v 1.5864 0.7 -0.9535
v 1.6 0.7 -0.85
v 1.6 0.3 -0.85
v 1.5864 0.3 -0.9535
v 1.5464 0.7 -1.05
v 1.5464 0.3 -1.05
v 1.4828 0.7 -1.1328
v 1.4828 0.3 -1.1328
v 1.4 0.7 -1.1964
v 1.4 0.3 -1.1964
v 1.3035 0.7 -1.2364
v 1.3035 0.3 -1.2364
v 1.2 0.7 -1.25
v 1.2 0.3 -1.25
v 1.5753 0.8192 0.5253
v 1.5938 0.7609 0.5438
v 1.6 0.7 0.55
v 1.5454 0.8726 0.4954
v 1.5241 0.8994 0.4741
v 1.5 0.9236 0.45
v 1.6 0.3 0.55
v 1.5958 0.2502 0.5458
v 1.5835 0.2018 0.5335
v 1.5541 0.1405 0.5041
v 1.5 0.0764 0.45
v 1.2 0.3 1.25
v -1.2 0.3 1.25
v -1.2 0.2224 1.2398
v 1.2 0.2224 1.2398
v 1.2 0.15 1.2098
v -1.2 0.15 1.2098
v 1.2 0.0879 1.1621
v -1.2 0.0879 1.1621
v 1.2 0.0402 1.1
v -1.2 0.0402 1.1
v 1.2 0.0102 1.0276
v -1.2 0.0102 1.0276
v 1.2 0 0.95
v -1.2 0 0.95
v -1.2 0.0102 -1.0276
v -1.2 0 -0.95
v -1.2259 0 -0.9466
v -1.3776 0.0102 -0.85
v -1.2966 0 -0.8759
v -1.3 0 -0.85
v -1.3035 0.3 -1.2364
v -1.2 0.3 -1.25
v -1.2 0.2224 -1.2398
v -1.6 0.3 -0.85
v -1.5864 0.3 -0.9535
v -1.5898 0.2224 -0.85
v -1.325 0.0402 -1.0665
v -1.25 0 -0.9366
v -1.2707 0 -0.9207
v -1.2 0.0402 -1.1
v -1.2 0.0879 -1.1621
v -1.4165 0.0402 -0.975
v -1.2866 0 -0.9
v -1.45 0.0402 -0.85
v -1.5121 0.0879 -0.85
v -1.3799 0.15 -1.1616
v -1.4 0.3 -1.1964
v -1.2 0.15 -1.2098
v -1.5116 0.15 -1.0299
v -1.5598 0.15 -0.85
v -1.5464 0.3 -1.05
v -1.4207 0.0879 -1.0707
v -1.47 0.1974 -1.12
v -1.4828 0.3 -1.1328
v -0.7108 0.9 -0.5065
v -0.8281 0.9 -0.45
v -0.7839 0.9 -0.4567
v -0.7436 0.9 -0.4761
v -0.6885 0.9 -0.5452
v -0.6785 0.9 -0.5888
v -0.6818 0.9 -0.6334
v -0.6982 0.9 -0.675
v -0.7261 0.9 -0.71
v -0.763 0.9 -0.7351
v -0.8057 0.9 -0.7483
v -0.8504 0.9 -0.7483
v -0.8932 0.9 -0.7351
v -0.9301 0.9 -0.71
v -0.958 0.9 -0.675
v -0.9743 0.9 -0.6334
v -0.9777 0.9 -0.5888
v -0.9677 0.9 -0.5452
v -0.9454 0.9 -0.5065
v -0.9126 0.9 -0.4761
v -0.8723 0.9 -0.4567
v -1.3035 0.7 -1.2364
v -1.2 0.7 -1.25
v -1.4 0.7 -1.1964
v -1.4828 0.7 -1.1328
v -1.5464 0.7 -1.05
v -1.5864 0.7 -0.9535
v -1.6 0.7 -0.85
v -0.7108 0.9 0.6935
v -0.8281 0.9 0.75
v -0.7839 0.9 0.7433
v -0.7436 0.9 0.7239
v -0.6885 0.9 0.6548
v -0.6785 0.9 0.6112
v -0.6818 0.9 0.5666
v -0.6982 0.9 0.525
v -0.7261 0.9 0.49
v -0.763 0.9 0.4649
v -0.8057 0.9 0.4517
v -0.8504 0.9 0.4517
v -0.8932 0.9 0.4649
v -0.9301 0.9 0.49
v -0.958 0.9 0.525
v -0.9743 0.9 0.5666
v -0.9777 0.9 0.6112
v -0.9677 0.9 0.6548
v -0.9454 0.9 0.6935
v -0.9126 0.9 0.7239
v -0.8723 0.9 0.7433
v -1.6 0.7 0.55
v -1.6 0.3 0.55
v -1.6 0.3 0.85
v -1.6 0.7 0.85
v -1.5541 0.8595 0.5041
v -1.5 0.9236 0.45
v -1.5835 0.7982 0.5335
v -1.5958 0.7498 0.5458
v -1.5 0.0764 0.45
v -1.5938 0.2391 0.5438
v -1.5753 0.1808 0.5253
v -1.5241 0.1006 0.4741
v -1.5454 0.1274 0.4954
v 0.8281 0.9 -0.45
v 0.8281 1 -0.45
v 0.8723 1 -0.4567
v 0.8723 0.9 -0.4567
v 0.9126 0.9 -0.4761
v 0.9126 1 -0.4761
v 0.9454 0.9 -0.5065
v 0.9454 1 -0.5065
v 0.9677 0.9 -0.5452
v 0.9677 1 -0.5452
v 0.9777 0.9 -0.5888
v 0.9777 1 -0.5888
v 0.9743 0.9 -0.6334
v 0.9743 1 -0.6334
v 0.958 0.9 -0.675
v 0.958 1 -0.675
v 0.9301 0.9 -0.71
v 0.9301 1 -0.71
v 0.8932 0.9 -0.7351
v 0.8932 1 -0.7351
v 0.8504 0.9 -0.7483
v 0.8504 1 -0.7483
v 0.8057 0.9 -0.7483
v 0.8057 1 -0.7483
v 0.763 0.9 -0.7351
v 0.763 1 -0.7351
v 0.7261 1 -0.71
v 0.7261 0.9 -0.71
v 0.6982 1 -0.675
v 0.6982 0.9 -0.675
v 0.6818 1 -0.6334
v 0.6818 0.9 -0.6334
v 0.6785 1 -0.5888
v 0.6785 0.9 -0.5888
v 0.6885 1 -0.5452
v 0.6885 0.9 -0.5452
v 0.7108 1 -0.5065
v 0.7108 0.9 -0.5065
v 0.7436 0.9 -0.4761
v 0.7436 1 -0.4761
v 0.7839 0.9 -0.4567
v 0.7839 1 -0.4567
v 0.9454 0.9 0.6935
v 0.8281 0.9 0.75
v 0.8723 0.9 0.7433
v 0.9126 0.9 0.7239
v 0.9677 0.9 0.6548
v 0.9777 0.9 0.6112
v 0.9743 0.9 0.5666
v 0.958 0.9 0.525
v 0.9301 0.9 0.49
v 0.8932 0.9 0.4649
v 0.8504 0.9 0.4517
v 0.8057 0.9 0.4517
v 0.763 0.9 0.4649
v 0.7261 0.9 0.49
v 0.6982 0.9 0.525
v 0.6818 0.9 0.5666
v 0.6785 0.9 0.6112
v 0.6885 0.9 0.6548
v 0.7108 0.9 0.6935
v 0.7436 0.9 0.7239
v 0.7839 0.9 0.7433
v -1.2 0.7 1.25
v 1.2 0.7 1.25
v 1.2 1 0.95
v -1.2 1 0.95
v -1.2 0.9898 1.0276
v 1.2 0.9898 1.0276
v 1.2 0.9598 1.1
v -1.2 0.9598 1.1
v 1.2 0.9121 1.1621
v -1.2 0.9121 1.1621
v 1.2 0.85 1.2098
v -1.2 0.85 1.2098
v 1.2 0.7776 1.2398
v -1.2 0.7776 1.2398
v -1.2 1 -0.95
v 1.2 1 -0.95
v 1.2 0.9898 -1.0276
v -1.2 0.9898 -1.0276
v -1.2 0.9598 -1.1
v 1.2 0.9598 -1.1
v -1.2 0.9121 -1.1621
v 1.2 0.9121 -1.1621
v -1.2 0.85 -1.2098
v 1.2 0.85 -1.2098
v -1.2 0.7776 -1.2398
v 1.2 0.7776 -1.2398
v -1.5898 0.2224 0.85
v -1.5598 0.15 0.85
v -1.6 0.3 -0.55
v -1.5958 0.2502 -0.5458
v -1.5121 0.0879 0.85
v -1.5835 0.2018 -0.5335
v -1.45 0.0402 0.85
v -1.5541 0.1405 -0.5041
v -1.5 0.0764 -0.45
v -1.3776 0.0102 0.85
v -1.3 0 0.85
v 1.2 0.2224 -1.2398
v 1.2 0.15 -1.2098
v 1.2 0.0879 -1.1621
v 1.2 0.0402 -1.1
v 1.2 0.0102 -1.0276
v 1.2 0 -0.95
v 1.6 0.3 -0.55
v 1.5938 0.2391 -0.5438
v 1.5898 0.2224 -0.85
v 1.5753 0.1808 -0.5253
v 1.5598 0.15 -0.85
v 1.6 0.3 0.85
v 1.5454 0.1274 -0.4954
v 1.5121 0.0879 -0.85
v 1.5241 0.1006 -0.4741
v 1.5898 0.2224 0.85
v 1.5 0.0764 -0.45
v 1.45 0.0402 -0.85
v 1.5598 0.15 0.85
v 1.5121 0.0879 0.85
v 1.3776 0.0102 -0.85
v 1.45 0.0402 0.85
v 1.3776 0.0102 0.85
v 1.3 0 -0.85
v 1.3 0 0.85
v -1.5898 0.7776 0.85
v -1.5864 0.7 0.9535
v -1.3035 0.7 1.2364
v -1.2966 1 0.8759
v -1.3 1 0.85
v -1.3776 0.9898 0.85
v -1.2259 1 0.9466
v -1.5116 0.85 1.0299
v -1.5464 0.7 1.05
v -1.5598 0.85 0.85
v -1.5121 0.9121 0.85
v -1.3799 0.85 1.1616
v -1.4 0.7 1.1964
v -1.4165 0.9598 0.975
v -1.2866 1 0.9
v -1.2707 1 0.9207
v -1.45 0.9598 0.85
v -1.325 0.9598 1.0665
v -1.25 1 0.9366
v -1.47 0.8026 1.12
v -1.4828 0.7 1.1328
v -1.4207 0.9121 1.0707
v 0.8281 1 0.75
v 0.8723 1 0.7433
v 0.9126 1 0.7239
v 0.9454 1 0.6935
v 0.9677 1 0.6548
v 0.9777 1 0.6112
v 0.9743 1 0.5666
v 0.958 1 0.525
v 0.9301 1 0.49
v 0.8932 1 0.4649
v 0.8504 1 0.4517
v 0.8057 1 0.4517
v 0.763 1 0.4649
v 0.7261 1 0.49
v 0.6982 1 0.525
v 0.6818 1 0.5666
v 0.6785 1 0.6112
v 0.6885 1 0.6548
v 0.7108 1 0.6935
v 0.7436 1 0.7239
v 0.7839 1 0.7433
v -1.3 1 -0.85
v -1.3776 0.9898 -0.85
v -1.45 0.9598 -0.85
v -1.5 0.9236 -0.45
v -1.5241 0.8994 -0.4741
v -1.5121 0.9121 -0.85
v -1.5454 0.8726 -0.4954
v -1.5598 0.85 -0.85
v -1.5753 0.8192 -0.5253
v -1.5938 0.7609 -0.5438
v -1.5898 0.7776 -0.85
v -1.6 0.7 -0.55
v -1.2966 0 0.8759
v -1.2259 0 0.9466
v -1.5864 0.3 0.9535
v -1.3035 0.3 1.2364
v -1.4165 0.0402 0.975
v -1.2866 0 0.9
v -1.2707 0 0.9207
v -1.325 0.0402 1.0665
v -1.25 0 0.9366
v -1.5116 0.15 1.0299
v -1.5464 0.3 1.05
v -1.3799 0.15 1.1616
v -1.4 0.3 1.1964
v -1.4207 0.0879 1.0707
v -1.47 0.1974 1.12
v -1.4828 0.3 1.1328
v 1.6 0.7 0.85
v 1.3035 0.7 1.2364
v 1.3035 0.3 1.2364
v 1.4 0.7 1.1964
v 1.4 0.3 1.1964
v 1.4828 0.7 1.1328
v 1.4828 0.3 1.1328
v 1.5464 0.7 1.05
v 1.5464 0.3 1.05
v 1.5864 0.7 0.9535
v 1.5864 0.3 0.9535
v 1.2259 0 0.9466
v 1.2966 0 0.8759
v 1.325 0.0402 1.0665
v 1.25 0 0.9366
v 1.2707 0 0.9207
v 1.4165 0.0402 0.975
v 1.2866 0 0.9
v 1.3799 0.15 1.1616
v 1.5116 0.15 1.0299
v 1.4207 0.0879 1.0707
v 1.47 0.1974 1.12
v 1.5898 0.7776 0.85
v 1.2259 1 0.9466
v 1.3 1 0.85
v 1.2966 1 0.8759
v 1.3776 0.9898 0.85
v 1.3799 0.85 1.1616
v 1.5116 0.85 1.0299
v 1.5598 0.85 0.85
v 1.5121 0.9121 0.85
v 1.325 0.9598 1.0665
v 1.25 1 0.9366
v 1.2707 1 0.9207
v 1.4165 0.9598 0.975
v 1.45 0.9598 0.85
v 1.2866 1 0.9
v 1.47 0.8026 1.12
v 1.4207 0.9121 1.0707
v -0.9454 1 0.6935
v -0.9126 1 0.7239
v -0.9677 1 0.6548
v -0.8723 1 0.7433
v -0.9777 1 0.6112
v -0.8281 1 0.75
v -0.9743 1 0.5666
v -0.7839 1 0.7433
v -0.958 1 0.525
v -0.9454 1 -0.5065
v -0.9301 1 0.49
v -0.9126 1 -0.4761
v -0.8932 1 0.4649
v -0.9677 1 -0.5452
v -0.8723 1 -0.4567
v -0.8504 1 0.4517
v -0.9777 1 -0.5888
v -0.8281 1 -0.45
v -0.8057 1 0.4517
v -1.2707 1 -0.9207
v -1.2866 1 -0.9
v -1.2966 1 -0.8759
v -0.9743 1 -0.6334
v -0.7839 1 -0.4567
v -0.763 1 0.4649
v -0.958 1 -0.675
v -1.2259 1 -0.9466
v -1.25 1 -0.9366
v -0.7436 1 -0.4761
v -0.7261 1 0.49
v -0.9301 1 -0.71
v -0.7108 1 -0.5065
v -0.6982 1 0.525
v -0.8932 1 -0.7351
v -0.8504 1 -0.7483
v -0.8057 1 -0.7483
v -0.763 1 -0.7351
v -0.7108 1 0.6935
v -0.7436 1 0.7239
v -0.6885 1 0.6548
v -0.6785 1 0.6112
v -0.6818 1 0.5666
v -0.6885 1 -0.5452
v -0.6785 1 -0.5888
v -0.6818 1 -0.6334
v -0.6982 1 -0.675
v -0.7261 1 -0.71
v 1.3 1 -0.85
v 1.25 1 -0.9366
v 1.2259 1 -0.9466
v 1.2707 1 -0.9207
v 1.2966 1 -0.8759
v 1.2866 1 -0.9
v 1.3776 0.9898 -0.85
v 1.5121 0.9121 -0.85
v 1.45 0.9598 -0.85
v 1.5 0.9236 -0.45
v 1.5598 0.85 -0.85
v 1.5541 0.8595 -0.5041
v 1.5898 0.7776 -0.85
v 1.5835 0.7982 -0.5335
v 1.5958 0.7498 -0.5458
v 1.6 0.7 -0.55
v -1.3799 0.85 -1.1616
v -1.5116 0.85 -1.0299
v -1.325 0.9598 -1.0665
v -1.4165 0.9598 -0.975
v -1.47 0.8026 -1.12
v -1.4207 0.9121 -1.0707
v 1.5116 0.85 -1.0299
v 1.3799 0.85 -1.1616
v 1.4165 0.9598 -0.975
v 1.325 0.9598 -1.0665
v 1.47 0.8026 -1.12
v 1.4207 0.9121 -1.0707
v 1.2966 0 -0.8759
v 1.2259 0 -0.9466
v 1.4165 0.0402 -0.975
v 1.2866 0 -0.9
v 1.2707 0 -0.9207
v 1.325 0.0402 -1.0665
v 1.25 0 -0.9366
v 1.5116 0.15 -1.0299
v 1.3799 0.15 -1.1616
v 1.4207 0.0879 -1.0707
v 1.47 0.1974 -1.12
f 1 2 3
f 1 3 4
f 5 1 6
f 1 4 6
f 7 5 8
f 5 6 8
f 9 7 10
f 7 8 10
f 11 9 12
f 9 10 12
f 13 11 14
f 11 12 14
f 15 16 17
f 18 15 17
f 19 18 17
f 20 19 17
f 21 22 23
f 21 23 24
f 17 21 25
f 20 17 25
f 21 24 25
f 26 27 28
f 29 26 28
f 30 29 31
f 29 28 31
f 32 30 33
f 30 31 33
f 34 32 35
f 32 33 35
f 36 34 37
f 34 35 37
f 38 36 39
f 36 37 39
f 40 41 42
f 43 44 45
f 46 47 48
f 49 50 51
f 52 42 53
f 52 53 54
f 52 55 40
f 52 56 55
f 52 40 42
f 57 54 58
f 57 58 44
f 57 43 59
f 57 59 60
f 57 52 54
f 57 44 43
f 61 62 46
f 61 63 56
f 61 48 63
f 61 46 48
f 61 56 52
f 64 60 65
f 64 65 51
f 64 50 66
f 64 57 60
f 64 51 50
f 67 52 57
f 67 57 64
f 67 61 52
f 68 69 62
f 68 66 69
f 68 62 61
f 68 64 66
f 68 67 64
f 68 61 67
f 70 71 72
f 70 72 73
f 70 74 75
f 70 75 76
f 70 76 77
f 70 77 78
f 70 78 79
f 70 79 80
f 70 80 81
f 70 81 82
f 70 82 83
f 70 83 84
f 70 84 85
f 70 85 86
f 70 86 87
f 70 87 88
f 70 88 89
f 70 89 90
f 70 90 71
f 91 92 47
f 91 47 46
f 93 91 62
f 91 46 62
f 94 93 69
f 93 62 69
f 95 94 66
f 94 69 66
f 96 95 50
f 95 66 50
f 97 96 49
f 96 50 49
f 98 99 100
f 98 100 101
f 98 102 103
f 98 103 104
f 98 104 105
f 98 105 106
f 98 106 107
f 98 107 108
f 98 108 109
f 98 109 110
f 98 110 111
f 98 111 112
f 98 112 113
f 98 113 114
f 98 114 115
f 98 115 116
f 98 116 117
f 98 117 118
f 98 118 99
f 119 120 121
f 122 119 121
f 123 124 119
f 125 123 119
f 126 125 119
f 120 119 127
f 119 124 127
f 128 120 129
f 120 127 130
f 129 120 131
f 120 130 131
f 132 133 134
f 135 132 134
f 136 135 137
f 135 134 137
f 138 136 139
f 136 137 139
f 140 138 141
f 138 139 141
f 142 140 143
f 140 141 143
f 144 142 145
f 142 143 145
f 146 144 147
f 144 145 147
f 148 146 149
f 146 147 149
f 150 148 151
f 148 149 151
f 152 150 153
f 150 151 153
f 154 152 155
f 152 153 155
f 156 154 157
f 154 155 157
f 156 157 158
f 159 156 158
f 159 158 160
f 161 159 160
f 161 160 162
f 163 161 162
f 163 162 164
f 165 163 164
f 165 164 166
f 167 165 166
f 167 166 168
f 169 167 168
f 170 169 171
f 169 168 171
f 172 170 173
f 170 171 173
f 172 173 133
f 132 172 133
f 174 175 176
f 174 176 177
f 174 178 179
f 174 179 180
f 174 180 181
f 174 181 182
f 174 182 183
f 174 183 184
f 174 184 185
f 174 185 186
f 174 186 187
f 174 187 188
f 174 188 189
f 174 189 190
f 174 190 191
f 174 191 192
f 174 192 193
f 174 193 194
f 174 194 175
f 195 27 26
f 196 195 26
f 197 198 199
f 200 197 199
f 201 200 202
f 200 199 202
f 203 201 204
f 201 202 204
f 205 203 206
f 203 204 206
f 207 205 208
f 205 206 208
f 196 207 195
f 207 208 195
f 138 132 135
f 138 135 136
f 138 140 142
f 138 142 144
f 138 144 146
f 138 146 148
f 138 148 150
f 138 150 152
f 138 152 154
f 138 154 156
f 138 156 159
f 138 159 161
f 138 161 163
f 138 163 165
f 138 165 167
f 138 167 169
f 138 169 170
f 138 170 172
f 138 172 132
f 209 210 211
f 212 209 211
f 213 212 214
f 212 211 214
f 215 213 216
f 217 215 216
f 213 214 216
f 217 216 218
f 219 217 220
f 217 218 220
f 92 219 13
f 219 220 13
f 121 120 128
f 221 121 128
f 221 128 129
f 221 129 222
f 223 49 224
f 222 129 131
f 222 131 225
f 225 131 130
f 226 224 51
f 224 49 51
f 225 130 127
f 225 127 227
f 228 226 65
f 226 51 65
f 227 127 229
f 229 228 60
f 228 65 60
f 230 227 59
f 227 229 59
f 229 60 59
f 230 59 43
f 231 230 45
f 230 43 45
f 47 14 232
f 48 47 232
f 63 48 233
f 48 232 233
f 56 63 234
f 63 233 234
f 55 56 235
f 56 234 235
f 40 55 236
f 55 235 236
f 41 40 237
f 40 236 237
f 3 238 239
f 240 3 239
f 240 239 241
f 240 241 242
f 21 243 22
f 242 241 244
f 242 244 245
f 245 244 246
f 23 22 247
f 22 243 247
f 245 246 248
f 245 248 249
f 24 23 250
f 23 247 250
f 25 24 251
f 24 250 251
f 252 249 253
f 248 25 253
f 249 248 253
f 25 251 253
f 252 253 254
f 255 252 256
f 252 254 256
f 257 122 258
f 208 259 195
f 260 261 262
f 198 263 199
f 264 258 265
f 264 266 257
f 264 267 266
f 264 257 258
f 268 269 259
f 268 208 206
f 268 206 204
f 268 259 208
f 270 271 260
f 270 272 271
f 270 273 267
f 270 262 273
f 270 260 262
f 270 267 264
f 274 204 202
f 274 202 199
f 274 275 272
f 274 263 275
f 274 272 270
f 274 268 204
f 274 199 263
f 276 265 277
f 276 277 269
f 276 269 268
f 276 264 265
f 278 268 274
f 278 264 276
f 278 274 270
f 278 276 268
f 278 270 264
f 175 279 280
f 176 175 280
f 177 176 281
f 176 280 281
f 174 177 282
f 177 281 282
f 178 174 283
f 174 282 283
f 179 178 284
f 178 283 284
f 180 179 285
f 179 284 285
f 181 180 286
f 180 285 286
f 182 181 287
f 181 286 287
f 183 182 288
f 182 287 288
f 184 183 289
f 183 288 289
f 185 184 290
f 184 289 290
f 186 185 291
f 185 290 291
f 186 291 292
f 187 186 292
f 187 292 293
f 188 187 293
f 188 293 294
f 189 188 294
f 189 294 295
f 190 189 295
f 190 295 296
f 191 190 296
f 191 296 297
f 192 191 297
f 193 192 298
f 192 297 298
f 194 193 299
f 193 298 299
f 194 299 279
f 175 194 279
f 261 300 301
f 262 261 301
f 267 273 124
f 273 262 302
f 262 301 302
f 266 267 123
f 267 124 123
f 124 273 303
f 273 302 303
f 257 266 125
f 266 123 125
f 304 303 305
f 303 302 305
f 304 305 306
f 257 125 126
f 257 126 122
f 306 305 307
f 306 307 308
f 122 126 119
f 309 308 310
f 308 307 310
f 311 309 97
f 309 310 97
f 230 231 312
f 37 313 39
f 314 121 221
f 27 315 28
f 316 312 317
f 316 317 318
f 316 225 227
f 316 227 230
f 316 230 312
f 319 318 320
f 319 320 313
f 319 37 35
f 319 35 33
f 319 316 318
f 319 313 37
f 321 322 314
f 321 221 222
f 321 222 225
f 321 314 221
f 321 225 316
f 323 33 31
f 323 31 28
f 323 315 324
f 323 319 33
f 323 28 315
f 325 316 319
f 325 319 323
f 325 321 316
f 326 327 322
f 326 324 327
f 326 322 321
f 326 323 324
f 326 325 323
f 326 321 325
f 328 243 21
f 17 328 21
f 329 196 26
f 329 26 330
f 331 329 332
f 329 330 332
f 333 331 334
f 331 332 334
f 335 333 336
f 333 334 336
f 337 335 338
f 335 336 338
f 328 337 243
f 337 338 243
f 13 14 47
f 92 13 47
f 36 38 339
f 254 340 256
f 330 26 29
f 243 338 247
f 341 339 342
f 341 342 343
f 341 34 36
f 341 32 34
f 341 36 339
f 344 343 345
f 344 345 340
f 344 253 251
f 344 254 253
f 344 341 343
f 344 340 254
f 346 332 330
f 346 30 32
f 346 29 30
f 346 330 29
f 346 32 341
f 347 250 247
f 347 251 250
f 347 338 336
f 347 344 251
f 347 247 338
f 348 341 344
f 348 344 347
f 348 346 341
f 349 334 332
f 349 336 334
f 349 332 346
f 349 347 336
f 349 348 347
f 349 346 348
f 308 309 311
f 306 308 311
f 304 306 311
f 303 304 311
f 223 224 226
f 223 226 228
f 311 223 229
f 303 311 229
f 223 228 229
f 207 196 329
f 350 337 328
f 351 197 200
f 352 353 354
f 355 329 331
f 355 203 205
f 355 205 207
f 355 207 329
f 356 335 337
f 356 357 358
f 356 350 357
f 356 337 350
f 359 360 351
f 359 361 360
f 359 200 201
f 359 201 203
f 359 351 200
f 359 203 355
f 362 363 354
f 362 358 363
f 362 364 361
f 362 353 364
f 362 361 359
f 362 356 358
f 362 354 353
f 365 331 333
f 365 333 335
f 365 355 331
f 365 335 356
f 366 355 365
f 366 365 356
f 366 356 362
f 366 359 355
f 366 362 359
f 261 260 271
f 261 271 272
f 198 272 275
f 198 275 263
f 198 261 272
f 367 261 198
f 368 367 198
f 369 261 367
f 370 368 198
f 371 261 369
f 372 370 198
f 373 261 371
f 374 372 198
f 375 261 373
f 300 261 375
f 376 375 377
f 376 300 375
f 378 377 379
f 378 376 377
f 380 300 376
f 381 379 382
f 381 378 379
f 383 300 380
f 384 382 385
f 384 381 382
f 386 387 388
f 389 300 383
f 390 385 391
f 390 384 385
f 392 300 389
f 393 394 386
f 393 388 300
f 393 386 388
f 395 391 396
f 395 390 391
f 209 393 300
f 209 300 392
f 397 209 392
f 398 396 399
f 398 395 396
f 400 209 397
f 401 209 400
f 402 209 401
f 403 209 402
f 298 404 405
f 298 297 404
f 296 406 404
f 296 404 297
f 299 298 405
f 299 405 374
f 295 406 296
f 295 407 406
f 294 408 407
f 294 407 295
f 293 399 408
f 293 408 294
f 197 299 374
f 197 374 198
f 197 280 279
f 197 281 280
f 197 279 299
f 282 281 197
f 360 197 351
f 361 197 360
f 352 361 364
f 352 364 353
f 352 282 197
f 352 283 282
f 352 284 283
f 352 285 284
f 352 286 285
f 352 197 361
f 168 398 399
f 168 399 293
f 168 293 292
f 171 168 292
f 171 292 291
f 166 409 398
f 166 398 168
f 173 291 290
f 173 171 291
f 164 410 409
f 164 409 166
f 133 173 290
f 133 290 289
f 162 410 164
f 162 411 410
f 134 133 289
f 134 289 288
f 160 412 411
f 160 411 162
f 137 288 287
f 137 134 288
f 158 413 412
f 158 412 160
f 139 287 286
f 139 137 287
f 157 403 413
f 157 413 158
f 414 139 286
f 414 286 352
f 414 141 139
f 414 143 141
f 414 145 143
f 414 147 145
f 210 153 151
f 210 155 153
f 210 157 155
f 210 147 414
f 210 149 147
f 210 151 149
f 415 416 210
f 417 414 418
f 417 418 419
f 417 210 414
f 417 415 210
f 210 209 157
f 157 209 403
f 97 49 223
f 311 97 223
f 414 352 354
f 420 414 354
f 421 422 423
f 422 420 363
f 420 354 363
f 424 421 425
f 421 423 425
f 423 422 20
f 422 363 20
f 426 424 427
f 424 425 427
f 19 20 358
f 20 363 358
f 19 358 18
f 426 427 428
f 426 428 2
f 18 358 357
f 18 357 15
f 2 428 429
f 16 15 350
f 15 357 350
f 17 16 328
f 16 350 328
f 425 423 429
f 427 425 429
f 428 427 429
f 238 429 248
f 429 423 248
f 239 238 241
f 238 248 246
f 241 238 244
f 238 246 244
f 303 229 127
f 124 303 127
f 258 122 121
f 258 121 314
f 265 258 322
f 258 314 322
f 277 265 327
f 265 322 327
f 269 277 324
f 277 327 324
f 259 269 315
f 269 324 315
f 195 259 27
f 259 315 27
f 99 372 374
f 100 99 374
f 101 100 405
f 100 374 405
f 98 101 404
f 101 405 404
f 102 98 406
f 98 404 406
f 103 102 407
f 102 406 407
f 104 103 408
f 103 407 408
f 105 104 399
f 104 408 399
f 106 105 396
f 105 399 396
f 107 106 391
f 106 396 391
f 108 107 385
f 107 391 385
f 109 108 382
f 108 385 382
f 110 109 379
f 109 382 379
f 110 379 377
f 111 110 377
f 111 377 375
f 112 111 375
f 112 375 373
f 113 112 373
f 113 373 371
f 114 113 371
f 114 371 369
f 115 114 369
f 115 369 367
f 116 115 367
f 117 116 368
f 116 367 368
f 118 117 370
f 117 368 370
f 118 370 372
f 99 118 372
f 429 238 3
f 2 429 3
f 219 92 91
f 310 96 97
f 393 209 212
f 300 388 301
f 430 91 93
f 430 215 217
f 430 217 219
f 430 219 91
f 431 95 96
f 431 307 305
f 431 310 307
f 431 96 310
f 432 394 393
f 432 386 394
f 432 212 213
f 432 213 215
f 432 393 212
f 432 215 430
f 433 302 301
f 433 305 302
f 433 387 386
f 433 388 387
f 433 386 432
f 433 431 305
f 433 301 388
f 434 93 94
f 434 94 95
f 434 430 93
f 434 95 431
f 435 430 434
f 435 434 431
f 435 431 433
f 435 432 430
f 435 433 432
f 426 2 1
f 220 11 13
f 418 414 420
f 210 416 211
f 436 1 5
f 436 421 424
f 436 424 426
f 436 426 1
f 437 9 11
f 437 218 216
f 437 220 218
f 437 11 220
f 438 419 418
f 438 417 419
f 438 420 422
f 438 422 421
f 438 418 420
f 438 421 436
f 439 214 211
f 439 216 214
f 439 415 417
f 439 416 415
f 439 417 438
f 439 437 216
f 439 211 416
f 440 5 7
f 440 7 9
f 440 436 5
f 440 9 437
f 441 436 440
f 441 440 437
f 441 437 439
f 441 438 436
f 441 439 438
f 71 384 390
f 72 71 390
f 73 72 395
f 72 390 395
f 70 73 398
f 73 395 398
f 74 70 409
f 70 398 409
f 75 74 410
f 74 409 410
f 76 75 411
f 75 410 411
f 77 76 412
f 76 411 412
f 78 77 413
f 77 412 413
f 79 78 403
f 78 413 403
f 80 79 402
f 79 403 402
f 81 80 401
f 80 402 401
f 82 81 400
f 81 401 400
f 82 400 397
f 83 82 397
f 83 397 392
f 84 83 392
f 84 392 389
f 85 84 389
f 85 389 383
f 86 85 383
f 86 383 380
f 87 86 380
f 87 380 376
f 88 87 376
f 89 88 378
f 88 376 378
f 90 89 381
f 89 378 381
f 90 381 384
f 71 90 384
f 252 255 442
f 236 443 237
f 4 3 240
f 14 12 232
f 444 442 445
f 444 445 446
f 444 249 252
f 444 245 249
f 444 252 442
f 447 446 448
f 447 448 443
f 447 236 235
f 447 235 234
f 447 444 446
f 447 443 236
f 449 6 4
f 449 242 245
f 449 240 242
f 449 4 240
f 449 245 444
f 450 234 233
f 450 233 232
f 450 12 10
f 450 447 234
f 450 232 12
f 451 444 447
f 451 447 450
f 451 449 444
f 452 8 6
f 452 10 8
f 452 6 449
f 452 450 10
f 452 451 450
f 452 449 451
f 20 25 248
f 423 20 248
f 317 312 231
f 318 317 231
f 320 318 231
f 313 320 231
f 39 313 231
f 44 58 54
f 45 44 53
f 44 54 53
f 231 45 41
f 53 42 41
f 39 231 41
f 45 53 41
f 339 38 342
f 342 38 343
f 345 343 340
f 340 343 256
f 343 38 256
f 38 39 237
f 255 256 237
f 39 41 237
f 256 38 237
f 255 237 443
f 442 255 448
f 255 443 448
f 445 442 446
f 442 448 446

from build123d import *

# Parameters (mm, degrees)
BOSS_EXTRUDE1_DEPTH = 1
FILLET2_R           = 0.3
SKETCH2_R           = 0.15
CUT_EXTRUDE1_DEPTH  = 0.1


with BuildPart() as part:
    # Sketch1 → Boss-Extrude1 (new body)
    with BuildSketch(Plane(origin=(0, 0, 0), x_dir=(1, 0, 0), z_dir=(0, 1, 0))):
        with BuildLine():
            Line((-1.2, -1.25), (1.2, -1.25))
            ThreePointArc((1.2, -1.25), (1.482842712, -1.132842712), (1.6, -0.85))
            Line((1.6, -0.85), (1.6, -0.55))
            Line((1.6, -0.55), (1.5, -0.45))
            Line((1.5, -0.45), (1.5, 0.45))
            Line((1.5, 0.45), (1.6, 0.55))
            Line((1.6, 0.55), (1.6, 0.85))
            ThreePointArc((1.6, 0.85), (1.482842712, 1.132842712), (1.2, 1.25))
            Line((1.2, 1.25), (-1.2, 1.25))
            ThreePointArc((-1.2, 1.25), (-1.482842712, 1.132842712), (-1.6, 0.85))
            Line((-1.6, 0.85), (-1.6, 0.55))
            Line((-1.6, 0.55), (-1.5, 0.45))
            Line((-1.5, 0.45), (-1.5, -0.45))
            Line((-1.5, -0.45), (-1.6, -0.55))
            Line((-1.6, -0.55), (-1.6, -0.85))
            ThreePointArc((-1.6, -0.85), (-1.482842712, -1.132842712), (-1.2, -1.25))
        make_face()
    extrude(amount=BOSS_EXTRUDE1_DEPTH)

    # Fillet2
    # the kernel refuses this fillet: 0.3 mm, written as the material it takes off along each edge
    with BuildSketch(Plane(origin=(-1.2, 1, 0.85), x_dir=(-1, 0, 0), z_dir=(0, 0, -1))) as fillet2_piece_1:
        with BuildLine():
            CenterArc((0.4 - FILLET2_R, -FILLET2_R), FILLET2_R, 0, 90)
            Line((0.4 - FILLET2_R, 0), (0.4, 0))
            Line((0.4, 0), (0.4, -FILLET2_R))
        make_face()
    revolve(axis=Axis((-1.2, 1, 0.85), (0, 1, 0)), revolution_arc=90, mode=Mode.SUBTRACT)
    with BuildSketch(Plane(origin=(-1.2, 1, 1.25), x_dir=(0, -1, 0), z_dir=(1, 0, 0)), Plane(origin=(1.2, 1, -1.25), x_dir=(0, -1, 0), z_dir=(-1, 0, 0))) as fillet2_piece_2:
        with BuildLine():
            CenterArc((FILLET2_R, FILLET2_R), FILLET2_R, 180, 90)
            Line((0, FILLET2_R), (0, 0))
            Line((0, 0), (FILLET2_R, 0))
        make_face()
    extrude(amount=2.4, mode=Mode.SUBTRACT)
    with BuildSketch(Plane(origin=(-1.6, 1, -0.85), x_dir=(0, -1, 0), z_dir=(0, 0, 1)), Plane(origin=(1.6, 1, 0.2), x_dir=(0, -1, 0), z_dir=(0, 0, -1)), Plane(origin=(1.6, 1, 0.85), x_dir=(0, -1, 0), z_dir=(0, 0, -1)), Plane(origin=(-1.6, 1, -0.2), x_dir=(0, -1, 0), z_dir=(0, 0, 1))) as fillet2_piece_3:
        with BuildLine():
            CenterArc((FILLET2_R, FILLET2_R), FILLET2_R, 180, 90)
            Line((0, FILLET2_R), (0, 0))
            Line((0, 0), (FILLET2_R, 0))
        make_face()
    extrude(amount=1.05, mode=Mode.SUBTRACT)
    with BuildSketch(Plane(origin=(-1.2, 1, -0.85), x_dir=(0, 0, -1), z_dir=(1, 0, 0))) as fillet2_piece_4:
        with BuildLine():
            CenterArc((0.4 - FILLET2_R, -FILLET2_R), FILLET2_R, 0, 90)
            Line((0.4 - FILLET2_R, 0), (0.4, 0))
            Line((0.4, 0), (0.4, -FILLET2_R))
        make_face()
    revolve(axis=Axis((-1.2, 1, -0.85), (0, 1, 0)), revolution_arc=90, mode=Mode.SUBTRACT)
    with BuildSketch(Plane(origin=(1.2, 1, -0.85), x_dir=(1, 0, 0), z_dir=(0, 0, 1))) as fillet2_piece_5:
        with BuildLine():
            CenterArc((0.4 - FILLET2_R, -FILLET2_R), FILLET2_R, 0, 90)
            Line((0.4 - FILLET2_R, 0), (0.4, 0))
            Line((0.4, 0), (0.4, -FILLET2_R))
        make_face()
    revolve(axis=Axis((1.2, 1, -0.85), (0, 1, 0)), revolution_arc=90, mode=Mode.SUBTRACT)
    with BuildSketch(Plane(origin=(1.2, 1, 0.85), x_dir=(0, 0, 1), z_dir=(-1, 0, 0))) as fillet2_piece_6:
        with BuildLine():
            CenterArc((0.4 - FILLET2_R, -FILLET2_R), FILLET2_R, 0, 90)
            Line((0.4 - FILLET2_R, 0), (0.4, 0))
            Line((0.4, 0), (0.4, -FILLET2_R))
        make_face()
    revolve(axis=Axis((1.2, 1, 0.85), (0, 1, 0)), revolution_arc=90, mode=Mode.SUBTRACT)
    with BuildSketch(Plane(origin=(1.2, 0, -0.85), x_dir=(1, 0, 0), z_dir=(0, 0, 1))) as fillet2_piece_7:
        with BuildLine():
            CenterArc((0.4 - FILLET2_R, FILLET2_R), FILLET2_R, 270, 90)
            Line((0.4 - FILLET2_R, 0), (0.4, 0))
            Line((0.4, 0), (0.4, FILLET2_R))
        make_face()
    revolve(axis=Axis((1.2, 0, -0.85), (0, 1, 0)), revolution_arc=90, mode=Mode.SUBTRACT)
    with BuildSketch(Plane(origin=(-1.2, 0, -0.85), x_dir=(0, 0, -1), z_dir=(1, 0, 0))) as fillet2_piece_8:
        with BuildLine():
            CenterArc((0.4 - FILLET2_R, FILLET2_R), FILLET2_R, 270, 90)
            Line((0.4 - FILLET2_R, 0), (0.4, 0))
            Line((0.4, 0), (0.4, FILLET2_R))
        make_face()
    revolve(axis=Axis((-1.2, 0, -0.85), (0, 1, 0)), revolution_arc=90, mode=Mode.SUBTRACT)
    with BuildSketch(Plane(origin=(-1.6, 0, -0.2), x_dir=(0, 1, 0), z_dir=(0, 0, 1)), Plane(origin=(1.6, 0, 0.85), x_dir=(0, 1, 0), z_dir=(0, 0, -1)), Plane(origin=(-1.6, 0, -0.85), x_dir=(0, 1, 0), z_dir=(0, 0, 1)), Plane(origin=(1.6, 0, 0.2), x_dir=(0, 1, 0), z_dir=(0, 0, -1))) as fillet2_piece_9:
        with BuildLine():
            CenterArc((FILLET2_R, -FILLET2_R), FILLET2_R, 90, 90)
            Line((0, -FILLET2_R), (0, 0))
            Line((0, 0), (FILLET2_R, 0))
        make_face()
    extrude(amount=1.05, mode=Mode.SUBTRACT)
    with BuildSketch(Plane(origin=(-1.2, 0, 0.85), x_dir=(-1, 0, 0), z_dir=(0, 0, -1))) as fillet2_piece_10:
        with BuildLine():
            CenterArc((0.4 - FILLET2_R, FILLET2_R), FILLET2_R, 270, 90)
            Line((0.4 - FILLET2_R, 0), (0.4, 0))
            Line((0.4, 0), (0.4, FILLET2_R))
        make_face()
    revolve(axis=Axis((-1.2, 0, 0.85), (0, 1, 0)), revolution_arc=90, mode=Mode.SUBTRACT)
    with BuildSketch(Plane(origin=(1.2, 0, 0.85), x_dir=(0, 0, 1), z_dir=(-1, 0, 0))) as fillet2_piece_11:
        with BuildLine():
            CenterArc((0.4 - FILLET2_R, FILLET2_R), FILLET2_R, 270, 90)
            Line((0.4 - FILLET2_R, 0), (0.4, 0))
            Line((0.4, 0), (0.4, FILLET2_R))
        make_face()
    revolve(axis=Axis((1.2, 0, 0.85), (0, 1, 0)), revolution_arc=90, mode=Mode.SUBTRACT)
    with BuildSketch(Plane(origin=(1.2, 0, -1.25), x_dir=(0, 1, 0), z_dir=(-1, 0, 0)), Plane(origin=(-1.2, 0, 1.25), x_dir=(0, 1, 0), z_dir=(1, 0, 0))) as fillet2_piece_12:
        with BuildLine():
            CenterArc((FILLET2_R, -FILLET2_R), FILLET2_R, 90, 90)
            Line((0, -FILLET2_R), (0, 0))
            Line((0, 0), (FILLET2_R, 0))
        make_face()
    extrude(amount=2.4, mode=Mode.SUBTRACT)

    # Sketch2 → Cut-Extrude1 (cut)
    with BuildSketch(Plane(origin=(0, 1, 0), x_dir=(1, 0, 0), z_dir=(0, 1, 0))):
        with Locations(Location((0.82808468, 0.6, 0), (0, 0, 270))):
            Circle(SKETCH2_R)
        with Locations(Location((-0.82808468, 0.6, 0), (0, 0, 270))):
            Circle(SKETCH2_R)
        with Locations(Location((-0.82808468, -0.6, 0), (0, 0, 270))):
            Circle(SKETCH2_R)
        with Locations(Location((0.82808468, -0.6, 0), (0, 0, 270))):
            Circle(SKETCH2_R)
    extrude(amount=-CUT_EXTRUDE1_DEPTH, mode=Mode.SUBTRACT)


solid = part.part
